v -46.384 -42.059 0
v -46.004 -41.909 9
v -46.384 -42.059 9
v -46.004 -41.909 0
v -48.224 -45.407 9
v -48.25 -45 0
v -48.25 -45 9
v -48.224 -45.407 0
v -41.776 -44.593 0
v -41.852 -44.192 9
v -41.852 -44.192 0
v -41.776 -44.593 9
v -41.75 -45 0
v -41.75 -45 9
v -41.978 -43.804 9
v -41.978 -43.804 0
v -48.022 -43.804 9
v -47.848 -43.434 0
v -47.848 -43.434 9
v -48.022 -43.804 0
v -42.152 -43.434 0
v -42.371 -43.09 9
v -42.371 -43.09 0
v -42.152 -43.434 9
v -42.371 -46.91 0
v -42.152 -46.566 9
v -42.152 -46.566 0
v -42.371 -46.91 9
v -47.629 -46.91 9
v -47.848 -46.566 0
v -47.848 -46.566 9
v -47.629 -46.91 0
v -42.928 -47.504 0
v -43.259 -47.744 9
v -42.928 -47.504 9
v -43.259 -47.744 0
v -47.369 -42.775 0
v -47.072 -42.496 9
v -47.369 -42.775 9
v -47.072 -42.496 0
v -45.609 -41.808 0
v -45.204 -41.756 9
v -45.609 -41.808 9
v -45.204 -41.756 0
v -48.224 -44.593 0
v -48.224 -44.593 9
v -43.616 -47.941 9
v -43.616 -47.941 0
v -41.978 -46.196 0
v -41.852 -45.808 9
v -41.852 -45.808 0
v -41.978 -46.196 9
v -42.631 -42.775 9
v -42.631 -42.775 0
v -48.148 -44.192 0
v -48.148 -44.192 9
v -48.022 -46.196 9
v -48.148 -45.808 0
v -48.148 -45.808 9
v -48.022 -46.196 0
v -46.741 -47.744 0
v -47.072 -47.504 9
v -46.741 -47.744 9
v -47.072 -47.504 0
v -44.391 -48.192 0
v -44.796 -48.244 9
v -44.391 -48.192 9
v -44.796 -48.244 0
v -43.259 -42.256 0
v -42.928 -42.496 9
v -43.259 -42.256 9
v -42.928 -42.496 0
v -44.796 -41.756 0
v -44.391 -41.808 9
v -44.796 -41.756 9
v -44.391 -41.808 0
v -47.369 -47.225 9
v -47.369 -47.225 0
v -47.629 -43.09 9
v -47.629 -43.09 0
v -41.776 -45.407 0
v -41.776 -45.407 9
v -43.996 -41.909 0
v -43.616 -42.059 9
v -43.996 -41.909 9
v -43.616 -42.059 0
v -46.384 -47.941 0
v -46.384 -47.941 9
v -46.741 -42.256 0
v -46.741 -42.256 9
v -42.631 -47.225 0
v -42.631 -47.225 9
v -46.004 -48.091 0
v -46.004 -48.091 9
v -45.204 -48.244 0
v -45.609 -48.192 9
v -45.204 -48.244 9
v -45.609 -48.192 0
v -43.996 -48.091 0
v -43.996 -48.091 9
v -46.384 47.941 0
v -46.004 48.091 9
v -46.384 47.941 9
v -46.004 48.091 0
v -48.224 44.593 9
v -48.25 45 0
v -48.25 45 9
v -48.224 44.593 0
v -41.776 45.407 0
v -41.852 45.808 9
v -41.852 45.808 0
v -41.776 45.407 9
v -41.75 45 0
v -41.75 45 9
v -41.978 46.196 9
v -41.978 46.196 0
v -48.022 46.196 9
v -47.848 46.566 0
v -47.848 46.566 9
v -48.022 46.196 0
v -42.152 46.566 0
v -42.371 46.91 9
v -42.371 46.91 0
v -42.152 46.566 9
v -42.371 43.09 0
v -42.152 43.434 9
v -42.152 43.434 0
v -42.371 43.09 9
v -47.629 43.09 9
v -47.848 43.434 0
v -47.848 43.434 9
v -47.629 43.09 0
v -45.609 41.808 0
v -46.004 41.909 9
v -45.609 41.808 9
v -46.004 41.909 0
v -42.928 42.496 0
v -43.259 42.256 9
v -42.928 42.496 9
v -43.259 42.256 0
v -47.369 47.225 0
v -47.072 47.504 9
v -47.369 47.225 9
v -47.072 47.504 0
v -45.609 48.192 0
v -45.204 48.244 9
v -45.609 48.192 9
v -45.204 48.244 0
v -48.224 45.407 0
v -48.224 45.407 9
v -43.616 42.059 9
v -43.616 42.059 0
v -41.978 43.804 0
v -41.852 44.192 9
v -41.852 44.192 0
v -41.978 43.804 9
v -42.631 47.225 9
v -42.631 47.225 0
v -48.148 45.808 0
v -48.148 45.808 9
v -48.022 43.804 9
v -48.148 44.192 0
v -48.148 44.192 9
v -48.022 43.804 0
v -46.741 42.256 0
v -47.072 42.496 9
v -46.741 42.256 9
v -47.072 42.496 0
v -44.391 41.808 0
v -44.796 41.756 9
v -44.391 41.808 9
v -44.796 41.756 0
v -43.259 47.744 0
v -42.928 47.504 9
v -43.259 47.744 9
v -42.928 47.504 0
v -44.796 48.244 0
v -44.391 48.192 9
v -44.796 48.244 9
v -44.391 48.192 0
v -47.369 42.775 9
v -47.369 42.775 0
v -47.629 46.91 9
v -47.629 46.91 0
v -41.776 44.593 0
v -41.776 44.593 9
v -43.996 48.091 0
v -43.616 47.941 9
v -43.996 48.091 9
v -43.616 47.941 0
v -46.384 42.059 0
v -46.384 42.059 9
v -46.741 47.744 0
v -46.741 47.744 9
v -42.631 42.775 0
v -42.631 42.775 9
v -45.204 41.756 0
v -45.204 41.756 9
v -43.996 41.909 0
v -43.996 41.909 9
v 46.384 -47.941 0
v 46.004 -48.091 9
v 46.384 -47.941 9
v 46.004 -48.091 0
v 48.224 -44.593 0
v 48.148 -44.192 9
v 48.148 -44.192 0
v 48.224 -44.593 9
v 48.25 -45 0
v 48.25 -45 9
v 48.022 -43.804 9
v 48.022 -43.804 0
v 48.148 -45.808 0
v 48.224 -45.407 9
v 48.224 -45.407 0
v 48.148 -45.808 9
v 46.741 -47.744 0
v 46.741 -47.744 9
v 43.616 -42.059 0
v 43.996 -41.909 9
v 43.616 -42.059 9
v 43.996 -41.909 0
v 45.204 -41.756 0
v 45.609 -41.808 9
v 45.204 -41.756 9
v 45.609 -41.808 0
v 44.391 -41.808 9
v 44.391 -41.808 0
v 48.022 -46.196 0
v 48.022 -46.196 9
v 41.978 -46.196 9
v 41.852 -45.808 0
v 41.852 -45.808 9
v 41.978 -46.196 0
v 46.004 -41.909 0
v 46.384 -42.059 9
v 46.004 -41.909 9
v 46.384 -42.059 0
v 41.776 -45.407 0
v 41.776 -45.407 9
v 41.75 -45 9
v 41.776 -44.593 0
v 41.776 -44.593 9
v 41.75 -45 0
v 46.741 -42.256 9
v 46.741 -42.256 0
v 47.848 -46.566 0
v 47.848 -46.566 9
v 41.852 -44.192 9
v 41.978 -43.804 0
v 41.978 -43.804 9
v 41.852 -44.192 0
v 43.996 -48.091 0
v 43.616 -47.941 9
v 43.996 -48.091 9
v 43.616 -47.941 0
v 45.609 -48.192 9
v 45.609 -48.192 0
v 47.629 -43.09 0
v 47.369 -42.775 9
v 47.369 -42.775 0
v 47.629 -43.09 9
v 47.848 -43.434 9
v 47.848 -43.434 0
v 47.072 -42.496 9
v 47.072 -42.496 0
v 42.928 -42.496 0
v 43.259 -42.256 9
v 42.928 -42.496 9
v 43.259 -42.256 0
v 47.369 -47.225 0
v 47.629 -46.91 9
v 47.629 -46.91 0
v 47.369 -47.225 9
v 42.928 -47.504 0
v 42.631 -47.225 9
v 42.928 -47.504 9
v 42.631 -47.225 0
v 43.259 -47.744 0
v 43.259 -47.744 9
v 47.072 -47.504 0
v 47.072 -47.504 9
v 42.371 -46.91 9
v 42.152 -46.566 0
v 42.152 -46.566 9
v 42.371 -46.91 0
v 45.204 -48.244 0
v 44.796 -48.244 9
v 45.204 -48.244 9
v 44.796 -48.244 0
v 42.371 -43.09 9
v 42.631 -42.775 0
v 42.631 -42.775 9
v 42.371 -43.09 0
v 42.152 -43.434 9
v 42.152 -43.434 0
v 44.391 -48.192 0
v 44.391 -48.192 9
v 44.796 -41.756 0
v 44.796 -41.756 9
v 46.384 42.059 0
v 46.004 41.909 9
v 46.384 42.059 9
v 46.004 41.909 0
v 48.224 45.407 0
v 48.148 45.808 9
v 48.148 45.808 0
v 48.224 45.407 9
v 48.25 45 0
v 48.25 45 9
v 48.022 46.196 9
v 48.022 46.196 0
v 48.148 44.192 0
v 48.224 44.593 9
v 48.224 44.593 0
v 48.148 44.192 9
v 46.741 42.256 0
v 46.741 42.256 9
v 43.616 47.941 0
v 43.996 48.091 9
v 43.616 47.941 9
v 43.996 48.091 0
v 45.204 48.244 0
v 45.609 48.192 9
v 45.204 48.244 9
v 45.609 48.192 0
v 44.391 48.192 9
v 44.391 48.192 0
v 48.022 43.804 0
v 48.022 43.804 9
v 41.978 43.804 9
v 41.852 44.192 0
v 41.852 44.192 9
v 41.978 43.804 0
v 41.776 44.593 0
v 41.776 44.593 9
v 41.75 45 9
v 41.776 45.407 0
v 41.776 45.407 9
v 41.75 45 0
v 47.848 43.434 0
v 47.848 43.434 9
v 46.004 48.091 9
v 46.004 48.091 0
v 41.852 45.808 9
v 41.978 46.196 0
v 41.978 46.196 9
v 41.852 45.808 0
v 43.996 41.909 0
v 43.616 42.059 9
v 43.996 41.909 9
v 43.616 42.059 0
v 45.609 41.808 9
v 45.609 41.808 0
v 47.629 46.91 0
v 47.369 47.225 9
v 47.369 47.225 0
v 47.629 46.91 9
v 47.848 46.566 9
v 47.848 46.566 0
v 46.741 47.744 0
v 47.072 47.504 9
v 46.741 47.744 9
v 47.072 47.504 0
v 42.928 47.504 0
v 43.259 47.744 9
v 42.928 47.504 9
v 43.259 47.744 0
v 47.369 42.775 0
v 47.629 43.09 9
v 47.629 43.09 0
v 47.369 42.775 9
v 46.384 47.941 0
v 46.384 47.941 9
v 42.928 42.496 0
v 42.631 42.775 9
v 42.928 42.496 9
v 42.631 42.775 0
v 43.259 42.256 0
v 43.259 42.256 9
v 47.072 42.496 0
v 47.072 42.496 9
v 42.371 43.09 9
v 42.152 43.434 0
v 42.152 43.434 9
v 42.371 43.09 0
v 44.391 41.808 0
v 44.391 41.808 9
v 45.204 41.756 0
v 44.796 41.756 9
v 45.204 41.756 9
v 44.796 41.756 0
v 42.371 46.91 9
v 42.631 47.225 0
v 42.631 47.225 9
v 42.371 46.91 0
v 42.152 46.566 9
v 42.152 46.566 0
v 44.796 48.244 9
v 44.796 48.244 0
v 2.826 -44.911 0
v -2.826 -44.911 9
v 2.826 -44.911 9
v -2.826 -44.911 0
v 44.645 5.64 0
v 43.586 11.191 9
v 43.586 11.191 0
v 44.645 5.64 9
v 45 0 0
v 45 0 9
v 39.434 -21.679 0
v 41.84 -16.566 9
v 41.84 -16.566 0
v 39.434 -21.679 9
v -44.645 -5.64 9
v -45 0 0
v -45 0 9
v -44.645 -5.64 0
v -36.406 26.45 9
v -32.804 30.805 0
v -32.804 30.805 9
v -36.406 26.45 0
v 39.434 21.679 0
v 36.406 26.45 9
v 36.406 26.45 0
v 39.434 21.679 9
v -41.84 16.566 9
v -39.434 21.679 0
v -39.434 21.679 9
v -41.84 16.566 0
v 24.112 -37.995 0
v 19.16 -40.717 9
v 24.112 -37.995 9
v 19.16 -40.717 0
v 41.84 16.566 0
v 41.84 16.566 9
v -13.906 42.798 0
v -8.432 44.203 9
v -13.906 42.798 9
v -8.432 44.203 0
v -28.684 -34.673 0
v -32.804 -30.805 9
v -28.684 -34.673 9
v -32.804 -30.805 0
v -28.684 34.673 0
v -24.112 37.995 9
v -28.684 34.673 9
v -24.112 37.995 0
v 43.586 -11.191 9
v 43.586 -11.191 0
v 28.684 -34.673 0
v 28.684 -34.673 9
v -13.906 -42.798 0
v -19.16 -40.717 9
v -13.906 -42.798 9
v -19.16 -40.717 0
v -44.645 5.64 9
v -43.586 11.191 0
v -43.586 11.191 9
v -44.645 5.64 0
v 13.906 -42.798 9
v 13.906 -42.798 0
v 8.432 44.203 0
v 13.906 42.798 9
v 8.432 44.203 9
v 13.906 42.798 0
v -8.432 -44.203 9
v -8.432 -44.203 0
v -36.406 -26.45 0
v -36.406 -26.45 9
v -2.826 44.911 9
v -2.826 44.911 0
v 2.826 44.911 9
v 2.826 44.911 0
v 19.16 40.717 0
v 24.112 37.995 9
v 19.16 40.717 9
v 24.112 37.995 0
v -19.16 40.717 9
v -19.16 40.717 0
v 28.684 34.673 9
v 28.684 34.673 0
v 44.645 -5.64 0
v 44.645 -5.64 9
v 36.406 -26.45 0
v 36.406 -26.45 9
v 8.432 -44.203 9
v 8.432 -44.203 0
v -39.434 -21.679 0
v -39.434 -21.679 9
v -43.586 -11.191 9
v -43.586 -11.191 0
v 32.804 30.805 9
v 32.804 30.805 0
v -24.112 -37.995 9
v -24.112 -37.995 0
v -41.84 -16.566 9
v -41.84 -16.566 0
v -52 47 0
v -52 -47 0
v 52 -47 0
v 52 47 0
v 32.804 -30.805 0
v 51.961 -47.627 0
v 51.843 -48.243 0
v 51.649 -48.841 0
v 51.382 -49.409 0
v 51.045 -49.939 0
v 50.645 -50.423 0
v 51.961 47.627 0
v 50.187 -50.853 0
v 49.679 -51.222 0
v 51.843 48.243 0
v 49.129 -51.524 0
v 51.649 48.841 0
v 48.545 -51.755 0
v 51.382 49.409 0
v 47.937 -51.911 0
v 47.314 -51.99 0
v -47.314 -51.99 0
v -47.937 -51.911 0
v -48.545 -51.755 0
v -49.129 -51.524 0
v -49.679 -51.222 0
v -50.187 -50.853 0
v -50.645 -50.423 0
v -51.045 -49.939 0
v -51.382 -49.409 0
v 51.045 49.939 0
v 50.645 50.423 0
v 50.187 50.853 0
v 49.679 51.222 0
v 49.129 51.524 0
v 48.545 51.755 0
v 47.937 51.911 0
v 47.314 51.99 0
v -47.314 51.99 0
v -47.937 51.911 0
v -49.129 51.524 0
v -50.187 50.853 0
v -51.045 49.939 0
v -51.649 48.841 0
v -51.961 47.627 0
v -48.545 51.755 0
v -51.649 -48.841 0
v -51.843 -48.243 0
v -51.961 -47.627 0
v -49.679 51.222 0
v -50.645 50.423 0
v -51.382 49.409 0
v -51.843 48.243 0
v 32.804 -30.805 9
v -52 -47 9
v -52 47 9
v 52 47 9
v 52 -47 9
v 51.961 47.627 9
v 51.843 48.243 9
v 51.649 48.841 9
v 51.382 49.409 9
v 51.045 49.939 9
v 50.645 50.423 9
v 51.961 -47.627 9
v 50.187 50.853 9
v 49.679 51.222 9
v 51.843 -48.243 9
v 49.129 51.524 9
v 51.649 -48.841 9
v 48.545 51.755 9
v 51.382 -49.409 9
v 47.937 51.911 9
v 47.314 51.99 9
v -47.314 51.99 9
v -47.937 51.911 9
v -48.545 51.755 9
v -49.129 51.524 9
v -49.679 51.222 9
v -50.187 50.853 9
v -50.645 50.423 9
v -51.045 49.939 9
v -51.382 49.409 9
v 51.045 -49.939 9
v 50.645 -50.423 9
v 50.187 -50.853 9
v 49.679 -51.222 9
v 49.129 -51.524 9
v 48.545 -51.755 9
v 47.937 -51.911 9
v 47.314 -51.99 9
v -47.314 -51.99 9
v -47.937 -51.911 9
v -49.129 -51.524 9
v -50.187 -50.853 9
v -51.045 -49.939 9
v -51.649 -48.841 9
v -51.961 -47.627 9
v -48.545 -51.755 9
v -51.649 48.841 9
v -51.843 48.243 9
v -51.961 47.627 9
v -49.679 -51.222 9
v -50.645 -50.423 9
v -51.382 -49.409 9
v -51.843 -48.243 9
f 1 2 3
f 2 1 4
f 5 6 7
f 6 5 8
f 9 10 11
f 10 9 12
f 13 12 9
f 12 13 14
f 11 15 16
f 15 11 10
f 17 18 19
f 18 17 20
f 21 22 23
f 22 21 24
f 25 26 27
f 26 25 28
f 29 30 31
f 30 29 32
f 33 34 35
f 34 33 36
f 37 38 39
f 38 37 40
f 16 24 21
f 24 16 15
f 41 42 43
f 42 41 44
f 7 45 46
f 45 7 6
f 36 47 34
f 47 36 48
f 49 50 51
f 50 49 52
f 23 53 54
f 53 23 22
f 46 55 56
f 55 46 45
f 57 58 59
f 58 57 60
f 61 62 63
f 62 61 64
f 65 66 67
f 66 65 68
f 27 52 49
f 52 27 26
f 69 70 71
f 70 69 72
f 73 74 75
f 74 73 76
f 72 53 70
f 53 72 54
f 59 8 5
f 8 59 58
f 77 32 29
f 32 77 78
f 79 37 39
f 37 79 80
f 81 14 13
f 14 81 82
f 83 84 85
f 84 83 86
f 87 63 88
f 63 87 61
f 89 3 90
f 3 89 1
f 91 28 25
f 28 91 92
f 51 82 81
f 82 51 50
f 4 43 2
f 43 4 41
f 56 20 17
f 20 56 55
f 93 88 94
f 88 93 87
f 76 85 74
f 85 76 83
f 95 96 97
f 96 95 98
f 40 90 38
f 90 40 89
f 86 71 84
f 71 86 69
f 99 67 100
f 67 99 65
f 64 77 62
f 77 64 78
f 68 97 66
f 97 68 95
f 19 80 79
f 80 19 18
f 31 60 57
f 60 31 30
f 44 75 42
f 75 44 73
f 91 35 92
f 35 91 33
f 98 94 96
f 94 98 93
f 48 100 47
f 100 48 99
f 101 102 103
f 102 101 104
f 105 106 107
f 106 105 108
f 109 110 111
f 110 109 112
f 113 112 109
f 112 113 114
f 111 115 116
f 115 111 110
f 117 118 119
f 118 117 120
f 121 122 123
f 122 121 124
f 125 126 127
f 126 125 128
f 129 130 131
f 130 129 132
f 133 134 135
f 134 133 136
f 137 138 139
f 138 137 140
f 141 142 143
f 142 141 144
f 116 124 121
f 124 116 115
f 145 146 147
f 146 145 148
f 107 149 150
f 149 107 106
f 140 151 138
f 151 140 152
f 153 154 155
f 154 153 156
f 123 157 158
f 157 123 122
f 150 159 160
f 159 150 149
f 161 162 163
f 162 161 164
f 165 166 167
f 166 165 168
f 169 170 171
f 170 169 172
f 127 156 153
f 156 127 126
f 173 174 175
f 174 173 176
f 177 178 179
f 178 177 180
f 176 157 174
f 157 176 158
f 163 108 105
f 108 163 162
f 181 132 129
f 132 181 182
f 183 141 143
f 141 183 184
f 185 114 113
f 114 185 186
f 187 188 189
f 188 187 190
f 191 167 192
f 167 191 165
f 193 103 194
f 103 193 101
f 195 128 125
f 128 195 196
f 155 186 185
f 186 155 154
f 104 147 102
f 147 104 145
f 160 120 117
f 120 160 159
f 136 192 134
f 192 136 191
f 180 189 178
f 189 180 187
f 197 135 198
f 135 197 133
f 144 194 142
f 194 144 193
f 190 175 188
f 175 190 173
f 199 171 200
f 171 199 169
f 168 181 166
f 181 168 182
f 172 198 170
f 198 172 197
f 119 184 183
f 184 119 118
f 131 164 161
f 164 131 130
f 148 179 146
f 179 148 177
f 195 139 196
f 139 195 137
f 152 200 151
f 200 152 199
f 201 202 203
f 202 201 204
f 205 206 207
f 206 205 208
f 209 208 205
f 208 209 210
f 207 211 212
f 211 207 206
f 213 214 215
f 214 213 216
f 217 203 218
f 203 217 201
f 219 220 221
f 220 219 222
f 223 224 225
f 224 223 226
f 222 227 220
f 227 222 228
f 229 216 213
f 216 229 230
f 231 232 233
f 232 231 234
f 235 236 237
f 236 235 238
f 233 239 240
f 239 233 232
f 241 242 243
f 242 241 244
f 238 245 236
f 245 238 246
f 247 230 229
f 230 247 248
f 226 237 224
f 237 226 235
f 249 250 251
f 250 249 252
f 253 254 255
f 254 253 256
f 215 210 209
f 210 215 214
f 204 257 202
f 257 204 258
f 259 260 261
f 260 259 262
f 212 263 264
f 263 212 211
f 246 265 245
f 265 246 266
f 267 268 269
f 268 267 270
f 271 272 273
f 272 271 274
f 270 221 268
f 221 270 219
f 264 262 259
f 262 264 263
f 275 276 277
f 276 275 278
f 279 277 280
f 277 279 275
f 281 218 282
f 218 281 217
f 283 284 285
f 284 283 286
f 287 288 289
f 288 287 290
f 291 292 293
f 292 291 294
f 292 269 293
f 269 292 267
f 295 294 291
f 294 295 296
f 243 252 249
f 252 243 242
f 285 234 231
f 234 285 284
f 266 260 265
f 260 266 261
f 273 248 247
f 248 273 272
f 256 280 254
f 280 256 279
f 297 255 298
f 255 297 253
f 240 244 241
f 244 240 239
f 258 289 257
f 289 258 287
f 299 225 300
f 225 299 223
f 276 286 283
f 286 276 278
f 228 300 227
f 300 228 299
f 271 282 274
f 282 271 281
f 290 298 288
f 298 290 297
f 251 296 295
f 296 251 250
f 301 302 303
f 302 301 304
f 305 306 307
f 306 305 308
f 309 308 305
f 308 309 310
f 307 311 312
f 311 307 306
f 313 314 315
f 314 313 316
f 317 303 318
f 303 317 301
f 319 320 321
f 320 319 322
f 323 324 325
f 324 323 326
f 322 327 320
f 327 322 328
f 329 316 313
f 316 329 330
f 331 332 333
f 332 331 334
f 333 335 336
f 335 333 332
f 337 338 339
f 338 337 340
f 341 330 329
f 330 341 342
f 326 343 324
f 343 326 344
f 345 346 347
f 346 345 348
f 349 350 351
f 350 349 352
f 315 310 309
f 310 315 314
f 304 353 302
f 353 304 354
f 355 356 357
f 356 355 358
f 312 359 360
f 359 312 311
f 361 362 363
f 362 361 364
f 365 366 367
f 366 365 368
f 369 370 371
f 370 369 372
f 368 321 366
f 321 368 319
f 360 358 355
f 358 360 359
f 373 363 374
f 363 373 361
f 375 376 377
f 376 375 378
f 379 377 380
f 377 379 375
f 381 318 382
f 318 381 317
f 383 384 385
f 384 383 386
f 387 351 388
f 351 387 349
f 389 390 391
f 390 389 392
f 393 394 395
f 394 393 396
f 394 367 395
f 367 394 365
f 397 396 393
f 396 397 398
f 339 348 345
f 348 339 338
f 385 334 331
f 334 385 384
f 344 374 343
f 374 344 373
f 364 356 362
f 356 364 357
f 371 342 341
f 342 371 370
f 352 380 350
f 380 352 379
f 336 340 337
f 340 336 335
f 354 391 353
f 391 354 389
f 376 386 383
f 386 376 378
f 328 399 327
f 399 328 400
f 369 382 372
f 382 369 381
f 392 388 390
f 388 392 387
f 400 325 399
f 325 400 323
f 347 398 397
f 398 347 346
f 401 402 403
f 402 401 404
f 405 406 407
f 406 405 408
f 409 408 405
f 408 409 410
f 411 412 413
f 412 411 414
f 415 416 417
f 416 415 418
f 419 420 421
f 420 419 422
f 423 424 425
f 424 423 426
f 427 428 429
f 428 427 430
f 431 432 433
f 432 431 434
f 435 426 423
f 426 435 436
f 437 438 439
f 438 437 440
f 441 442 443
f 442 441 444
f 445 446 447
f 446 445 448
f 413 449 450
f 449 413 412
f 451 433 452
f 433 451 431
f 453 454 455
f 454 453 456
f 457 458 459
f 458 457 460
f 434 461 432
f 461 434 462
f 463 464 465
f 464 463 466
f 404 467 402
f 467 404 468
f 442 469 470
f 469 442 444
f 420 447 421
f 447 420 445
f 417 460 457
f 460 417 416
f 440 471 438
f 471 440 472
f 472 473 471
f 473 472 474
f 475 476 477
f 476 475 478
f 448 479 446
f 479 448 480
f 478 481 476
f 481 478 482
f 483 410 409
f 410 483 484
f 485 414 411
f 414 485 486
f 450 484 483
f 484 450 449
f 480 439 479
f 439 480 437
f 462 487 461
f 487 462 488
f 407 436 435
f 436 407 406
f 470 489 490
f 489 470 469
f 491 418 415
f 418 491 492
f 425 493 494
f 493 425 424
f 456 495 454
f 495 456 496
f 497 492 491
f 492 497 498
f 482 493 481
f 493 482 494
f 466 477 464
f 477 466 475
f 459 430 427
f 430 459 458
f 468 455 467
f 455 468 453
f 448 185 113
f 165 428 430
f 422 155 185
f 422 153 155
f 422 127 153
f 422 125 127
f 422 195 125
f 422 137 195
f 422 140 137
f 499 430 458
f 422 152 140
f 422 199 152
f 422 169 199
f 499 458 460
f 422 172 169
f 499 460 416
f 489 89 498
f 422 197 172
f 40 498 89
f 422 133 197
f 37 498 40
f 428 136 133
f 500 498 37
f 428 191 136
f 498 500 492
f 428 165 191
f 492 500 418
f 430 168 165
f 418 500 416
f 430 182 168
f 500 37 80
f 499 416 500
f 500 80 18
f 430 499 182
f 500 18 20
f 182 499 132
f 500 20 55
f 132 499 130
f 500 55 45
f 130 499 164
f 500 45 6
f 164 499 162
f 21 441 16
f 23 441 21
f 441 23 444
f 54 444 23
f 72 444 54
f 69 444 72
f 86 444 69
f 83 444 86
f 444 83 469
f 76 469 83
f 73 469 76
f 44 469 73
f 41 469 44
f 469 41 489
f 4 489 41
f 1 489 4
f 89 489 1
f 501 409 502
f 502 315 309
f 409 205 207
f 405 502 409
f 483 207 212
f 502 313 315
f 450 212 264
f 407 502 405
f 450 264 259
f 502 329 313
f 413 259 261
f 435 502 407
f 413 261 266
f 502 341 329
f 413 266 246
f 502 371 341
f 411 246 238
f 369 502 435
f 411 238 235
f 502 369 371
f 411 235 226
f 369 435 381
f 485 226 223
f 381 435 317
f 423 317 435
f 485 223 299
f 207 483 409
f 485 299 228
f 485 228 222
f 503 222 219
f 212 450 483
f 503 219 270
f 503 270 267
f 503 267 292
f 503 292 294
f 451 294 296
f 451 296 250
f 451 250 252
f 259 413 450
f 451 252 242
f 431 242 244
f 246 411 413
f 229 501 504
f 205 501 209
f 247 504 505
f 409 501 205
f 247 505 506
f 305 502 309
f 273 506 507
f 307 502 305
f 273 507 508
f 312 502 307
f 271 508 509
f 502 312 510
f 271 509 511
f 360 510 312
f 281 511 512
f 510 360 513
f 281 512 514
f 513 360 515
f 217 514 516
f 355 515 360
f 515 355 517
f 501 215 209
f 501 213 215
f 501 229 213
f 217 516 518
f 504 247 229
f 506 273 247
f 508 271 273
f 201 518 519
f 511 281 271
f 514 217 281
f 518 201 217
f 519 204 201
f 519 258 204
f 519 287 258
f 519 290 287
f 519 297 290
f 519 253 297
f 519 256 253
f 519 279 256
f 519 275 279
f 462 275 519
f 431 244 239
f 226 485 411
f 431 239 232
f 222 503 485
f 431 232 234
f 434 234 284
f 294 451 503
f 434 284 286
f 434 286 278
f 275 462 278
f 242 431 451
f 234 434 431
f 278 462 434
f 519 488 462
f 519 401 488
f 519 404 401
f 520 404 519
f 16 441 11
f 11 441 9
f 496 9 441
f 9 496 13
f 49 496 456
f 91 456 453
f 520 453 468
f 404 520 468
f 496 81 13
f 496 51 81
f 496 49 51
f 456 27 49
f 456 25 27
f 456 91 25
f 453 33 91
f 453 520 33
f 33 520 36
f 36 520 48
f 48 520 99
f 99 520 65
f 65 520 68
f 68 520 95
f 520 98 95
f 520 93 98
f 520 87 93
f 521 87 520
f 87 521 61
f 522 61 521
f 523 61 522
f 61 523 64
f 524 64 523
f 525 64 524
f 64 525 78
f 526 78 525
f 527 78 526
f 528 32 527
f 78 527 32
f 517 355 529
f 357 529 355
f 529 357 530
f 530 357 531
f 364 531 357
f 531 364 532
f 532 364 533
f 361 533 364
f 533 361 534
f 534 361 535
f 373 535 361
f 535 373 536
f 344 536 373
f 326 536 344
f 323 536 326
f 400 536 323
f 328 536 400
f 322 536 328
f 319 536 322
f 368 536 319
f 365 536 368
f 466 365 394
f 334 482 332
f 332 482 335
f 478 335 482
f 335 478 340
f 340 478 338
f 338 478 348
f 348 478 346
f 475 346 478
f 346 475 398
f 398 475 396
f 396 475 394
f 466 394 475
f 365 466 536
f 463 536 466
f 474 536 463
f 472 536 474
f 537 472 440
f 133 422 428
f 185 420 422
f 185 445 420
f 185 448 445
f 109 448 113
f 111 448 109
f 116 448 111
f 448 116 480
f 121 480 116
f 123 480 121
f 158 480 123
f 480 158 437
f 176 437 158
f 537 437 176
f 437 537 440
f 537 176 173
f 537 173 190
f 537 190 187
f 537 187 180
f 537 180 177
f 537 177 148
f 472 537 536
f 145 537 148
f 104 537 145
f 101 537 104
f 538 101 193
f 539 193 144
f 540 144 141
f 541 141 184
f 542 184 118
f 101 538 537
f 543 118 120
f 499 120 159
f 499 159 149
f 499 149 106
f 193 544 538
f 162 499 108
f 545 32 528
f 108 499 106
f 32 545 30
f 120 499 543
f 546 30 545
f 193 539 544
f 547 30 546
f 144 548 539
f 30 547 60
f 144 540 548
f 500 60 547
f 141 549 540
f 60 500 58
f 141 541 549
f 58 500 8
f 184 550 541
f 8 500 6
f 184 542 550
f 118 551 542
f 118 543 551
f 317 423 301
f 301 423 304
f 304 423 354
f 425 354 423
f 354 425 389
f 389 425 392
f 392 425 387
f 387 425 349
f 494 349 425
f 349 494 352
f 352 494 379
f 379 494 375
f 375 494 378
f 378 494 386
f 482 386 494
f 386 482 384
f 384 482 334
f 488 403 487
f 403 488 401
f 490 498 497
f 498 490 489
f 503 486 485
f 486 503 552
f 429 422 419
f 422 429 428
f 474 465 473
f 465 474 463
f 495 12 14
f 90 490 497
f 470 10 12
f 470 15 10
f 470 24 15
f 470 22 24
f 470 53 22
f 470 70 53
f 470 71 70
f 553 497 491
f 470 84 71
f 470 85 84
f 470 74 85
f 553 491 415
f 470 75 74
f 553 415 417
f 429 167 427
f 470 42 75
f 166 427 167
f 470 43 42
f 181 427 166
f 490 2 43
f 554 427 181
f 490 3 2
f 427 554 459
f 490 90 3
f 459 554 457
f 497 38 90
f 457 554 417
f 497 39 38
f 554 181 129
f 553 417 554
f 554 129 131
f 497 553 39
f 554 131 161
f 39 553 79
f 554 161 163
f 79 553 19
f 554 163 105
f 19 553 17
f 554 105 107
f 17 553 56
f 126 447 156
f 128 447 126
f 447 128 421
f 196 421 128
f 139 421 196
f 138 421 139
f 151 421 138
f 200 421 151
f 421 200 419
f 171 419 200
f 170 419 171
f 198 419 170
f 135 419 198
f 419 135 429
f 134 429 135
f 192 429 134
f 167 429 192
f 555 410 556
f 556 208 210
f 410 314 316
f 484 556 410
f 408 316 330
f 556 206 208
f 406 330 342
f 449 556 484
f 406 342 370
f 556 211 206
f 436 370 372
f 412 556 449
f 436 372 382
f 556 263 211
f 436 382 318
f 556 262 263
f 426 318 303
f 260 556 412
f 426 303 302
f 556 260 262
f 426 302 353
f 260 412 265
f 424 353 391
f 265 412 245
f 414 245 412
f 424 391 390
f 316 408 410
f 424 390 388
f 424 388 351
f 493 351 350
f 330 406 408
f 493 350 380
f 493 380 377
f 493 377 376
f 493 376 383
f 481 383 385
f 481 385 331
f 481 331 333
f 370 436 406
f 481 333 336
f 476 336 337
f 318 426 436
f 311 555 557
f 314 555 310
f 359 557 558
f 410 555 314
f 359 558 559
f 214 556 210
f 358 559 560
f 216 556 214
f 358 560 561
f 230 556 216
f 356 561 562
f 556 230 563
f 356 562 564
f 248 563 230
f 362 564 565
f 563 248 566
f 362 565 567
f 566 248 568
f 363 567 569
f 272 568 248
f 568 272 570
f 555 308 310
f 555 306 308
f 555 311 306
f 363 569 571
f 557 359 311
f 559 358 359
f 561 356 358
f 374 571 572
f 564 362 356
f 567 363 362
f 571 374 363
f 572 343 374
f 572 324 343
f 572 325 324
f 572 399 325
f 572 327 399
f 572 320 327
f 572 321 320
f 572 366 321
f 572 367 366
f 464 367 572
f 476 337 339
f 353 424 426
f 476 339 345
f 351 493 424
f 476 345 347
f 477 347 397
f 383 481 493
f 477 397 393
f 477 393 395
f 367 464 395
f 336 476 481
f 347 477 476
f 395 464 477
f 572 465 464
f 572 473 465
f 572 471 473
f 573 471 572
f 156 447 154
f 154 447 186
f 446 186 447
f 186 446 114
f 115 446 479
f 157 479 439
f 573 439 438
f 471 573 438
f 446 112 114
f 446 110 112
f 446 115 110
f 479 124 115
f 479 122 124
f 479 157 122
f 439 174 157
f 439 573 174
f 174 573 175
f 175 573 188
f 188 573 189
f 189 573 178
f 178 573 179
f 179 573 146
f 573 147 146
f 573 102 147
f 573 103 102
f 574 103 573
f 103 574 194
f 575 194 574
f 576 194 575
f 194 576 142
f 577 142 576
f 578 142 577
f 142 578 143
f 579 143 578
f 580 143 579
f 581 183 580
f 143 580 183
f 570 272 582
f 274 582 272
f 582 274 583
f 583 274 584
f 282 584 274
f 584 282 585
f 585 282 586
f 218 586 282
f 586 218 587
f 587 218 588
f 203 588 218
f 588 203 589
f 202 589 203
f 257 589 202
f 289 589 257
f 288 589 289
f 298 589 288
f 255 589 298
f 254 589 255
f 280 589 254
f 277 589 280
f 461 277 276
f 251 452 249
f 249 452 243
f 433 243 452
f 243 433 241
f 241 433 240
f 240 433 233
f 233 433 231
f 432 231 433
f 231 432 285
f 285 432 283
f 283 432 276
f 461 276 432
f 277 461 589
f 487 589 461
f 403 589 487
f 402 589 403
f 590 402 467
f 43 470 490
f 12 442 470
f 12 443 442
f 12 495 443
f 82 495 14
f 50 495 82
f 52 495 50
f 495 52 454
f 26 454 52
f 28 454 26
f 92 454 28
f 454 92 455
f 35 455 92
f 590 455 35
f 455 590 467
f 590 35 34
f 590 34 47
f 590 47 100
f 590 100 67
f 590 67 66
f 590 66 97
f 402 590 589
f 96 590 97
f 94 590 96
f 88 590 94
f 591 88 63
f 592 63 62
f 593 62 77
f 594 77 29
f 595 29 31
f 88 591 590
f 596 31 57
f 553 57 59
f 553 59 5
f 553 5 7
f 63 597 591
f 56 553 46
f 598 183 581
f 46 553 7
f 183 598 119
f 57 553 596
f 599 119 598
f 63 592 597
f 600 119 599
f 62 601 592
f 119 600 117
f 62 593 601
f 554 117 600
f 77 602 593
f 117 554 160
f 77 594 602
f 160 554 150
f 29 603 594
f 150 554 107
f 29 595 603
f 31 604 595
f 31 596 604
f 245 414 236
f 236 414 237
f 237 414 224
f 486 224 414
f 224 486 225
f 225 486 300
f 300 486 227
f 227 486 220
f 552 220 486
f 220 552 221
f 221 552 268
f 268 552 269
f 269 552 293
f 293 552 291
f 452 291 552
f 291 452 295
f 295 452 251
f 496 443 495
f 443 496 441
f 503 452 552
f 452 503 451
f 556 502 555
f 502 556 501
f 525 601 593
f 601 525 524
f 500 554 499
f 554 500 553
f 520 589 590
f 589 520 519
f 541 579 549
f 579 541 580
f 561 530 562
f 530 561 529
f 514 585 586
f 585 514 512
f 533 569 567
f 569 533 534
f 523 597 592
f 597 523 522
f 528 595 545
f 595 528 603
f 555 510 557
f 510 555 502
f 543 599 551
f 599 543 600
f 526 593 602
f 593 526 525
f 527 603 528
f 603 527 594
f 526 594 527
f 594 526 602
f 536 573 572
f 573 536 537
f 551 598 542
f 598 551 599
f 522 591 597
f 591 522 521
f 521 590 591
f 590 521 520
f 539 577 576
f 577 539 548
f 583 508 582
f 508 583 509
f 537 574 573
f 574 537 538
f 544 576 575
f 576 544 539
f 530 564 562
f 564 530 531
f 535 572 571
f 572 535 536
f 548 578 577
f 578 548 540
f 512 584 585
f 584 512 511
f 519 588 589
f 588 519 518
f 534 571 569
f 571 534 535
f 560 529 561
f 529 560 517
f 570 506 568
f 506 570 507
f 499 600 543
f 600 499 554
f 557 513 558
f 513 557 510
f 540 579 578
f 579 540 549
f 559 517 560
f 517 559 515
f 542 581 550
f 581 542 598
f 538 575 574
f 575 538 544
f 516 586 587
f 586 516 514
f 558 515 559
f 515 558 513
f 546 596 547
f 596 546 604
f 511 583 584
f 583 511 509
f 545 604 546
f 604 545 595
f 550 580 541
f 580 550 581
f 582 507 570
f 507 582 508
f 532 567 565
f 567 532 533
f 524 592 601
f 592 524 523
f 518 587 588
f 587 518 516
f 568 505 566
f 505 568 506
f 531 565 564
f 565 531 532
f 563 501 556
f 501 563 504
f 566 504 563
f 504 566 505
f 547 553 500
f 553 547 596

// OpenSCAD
$fn = 50;

difference() {
	union() {
		hull() {
			translate(v = [-47.0, 47.0, 0]) {
				cylinder(h = 9, r = 5);
			}
			translate(v = [47.0, 47.0, 0]) {
				cylinder(h = 9, r = 5);
			}
			translate(v = [-47.0, -47.0, 0]) {
				cylinder(h = 9, r = 5);
			}
			translate(v = [47.0, -47.0, 0]) {
				cylinder(h = 9, r = 5);
			}
		}
	}
	union() {
		translate(v = [-45.0, -45.0, -100.0]) {
			cylinder(h = 200, r = 3.25);
		}
		translate(v = [-45.0, 45.0, -100.0]) {
			cylinder(h = 200, r = 3.25);
		}
		translate(v = [45.0, -45.0, -100.0]) {
			cylinder(h = 200, r = 3.25);
		}
		translate(v = [45.0, 45.0, -100.0]) {
			cylinder(h = 200, r = 3.25);
		}
		translate(v = [-45.0, -45.0, -100.0]) {
			cylinder(h = 200, r = 1.8);
		}
		translate(v = [-45.0, 45.0, -100.0]) {
			cylinder(h = 200, r = 1.8);
		}
		translate(v = [45.0, -45.0, -100.0]) {
			cylinder(h = 200, r = 1.8);
		}
		translate(v = [45.0, 45.0, -100.0]) {
			cylinder(h = 200, r = 1.8);
		}
		cylinder(h = 9, r = 45.0);
	}
}
